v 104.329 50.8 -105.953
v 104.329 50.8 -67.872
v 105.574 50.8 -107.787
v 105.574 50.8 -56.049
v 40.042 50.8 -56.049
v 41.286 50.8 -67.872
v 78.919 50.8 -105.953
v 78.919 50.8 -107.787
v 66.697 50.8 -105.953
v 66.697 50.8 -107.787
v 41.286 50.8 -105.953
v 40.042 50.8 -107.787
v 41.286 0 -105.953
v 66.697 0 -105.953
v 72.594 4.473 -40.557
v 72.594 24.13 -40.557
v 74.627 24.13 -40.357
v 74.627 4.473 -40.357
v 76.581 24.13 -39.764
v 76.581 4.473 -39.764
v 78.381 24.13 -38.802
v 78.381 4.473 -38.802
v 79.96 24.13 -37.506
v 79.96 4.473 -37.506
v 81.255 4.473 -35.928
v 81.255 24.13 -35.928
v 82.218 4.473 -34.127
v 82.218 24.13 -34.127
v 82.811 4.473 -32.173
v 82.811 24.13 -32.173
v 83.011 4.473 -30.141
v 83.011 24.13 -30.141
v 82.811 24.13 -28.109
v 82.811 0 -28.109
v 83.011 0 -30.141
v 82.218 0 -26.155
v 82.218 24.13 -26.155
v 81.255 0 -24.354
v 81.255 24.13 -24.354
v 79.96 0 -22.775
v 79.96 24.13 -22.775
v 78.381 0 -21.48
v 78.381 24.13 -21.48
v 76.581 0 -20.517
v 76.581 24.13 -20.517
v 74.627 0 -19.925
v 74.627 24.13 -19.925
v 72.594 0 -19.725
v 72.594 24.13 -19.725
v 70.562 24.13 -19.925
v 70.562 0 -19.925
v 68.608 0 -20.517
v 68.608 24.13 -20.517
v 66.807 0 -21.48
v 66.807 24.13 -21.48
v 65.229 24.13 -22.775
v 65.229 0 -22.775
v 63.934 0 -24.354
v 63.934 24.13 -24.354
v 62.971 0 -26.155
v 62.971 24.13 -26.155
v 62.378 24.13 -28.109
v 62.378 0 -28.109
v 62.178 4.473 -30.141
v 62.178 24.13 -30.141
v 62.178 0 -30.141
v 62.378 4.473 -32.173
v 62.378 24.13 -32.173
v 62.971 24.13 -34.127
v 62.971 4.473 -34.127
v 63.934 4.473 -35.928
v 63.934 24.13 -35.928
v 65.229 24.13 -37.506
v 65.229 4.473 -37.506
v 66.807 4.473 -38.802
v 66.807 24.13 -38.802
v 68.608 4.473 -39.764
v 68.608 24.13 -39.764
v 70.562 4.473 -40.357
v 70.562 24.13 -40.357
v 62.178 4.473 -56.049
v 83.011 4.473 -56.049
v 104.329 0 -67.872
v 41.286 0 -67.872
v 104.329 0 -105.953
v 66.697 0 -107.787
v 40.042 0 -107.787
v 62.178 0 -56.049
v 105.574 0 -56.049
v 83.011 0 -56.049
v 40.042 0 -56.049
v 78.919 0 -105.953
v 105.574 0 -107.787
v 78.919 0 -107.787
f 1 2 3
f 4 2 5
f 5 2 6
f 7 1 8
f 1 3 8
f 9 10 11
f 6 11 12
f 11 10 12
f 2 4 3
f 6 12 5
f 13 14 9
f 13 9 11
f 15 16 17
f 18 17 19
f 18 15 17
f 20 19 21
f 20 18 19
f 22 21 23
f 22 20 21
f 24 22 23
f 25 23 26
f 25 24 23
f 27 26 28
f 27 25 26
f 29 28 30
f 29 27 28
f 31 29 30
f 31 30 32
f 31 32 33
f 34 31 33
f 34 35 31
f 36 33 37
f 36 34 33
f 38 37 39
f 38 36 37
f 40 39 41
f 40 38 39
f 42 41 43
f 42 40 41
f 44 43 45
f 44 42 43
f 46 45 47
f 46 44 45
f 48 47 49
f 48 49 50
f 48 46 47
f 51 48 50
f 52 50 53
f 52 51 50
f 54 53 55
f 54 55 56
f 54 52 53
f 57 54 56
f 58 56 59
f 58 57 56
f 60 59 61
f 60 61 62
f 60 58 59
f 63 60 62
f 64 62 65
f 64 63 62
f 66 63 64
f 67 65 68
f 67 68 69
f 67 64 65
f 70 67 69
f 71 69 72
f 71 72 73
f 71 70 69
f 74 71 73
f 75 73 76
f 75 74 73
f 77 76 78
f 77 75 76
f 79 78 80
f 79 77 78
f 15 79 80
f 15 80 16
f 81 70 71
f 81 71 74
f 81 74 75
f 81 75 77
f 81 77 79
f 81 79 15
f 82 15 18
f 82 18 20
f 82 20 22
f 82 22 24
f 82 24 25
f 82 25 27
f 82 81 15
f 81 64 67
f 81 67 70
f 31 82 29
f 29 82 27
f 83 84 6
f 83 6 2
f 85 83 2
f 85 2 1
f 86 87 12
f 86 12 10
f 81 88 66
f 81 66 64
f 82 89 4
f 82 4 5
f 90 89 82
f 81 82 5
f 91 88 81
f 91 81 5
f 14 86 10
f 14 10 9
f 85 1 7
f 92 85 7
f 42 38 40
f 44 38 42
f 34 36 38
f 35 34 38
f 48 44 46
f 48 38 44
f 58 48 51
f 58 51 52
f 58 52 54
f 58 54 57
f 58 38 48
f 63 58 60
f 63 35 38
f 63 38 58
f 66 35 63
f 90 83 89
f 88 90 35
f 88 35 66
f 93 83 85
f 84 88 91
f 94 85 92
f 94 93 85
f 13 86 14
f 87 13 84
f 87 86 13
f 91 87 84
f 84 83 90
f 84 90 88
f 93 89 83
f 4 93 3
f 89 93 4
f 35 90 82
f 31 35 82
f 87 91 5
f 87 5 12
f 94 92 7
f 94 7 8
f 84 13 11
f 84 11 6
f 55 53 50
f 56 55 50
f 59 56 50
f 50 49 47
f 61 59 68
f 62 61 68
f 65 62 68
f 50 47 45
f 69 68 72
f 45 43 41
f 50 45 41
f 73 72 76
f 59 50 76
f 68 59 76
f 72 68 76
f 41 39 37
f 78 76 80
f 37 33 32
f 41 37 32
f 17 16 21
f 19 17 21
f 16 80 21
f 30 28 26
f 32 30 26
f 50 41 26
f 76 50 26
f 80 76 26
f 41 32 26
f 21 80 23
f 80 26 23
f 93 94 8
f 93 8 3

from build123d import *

# Parameters (mm, degrees)
BOSS_EXTRUDE1_DEPTH = 50.8
SKETCH3_W           = 20.832647018
SKETCH3_H           = 4.473256697
BOSS_EXTRUDE2_DEPTH = 25.908
SKETCH5_R           = 10.416323509
BOSS_EXTRUDE3_DEPTH = 24.13


with BuildPart() as part:
    # Sketch2 → Boss-Extrude1 (new body)
    with BuildSketch(Plane(origin=(0, 0, 0), x_dir=(1, 0, 0), z_dir=(0, 1, 0))):
        Polygon((66.696577012, 107.786627361), (66.696577012, 105.952916401), (41.286417012, 105.952916401), (41.286417012, 67.871966401), (104.329217012, 67.871966401), (104.329217012, 105.952916401), (78.919057012, 105.952916401), (78.919057012, 107.786627361), (105.573817012, 107.786627361), (105.573817012, 56.048909831), (40.041817012, 56.048909831), (40.041817012, 107.786627361), align=None)
    extrude(amount=BOSS_EXTRUDE1_DEPTH)

    # Sketch3 → Boss-Extrude2 (add)
    with BuildSketch(Plane.XY.offset(-56.048909831)):
        with Locations((72.594457012, 2.236628349)):
            Rectangle(SKETCH3_W, SKETCH3_H)
    extrude(amount=BOSS_EXTRUDE2_DEPTH)

    # Sketch5 → Boss-Extrude3 (add)
    with BuildSketch(Plane.XZ):
        with Locations(Location((72.594457012, -30.140909831, 0), (0, 0, 270))):
            Circle(SKETCH5_R)
    extrude(amount=-BOSS_EXTRUDE3_DEPTH)


solid = part.part
